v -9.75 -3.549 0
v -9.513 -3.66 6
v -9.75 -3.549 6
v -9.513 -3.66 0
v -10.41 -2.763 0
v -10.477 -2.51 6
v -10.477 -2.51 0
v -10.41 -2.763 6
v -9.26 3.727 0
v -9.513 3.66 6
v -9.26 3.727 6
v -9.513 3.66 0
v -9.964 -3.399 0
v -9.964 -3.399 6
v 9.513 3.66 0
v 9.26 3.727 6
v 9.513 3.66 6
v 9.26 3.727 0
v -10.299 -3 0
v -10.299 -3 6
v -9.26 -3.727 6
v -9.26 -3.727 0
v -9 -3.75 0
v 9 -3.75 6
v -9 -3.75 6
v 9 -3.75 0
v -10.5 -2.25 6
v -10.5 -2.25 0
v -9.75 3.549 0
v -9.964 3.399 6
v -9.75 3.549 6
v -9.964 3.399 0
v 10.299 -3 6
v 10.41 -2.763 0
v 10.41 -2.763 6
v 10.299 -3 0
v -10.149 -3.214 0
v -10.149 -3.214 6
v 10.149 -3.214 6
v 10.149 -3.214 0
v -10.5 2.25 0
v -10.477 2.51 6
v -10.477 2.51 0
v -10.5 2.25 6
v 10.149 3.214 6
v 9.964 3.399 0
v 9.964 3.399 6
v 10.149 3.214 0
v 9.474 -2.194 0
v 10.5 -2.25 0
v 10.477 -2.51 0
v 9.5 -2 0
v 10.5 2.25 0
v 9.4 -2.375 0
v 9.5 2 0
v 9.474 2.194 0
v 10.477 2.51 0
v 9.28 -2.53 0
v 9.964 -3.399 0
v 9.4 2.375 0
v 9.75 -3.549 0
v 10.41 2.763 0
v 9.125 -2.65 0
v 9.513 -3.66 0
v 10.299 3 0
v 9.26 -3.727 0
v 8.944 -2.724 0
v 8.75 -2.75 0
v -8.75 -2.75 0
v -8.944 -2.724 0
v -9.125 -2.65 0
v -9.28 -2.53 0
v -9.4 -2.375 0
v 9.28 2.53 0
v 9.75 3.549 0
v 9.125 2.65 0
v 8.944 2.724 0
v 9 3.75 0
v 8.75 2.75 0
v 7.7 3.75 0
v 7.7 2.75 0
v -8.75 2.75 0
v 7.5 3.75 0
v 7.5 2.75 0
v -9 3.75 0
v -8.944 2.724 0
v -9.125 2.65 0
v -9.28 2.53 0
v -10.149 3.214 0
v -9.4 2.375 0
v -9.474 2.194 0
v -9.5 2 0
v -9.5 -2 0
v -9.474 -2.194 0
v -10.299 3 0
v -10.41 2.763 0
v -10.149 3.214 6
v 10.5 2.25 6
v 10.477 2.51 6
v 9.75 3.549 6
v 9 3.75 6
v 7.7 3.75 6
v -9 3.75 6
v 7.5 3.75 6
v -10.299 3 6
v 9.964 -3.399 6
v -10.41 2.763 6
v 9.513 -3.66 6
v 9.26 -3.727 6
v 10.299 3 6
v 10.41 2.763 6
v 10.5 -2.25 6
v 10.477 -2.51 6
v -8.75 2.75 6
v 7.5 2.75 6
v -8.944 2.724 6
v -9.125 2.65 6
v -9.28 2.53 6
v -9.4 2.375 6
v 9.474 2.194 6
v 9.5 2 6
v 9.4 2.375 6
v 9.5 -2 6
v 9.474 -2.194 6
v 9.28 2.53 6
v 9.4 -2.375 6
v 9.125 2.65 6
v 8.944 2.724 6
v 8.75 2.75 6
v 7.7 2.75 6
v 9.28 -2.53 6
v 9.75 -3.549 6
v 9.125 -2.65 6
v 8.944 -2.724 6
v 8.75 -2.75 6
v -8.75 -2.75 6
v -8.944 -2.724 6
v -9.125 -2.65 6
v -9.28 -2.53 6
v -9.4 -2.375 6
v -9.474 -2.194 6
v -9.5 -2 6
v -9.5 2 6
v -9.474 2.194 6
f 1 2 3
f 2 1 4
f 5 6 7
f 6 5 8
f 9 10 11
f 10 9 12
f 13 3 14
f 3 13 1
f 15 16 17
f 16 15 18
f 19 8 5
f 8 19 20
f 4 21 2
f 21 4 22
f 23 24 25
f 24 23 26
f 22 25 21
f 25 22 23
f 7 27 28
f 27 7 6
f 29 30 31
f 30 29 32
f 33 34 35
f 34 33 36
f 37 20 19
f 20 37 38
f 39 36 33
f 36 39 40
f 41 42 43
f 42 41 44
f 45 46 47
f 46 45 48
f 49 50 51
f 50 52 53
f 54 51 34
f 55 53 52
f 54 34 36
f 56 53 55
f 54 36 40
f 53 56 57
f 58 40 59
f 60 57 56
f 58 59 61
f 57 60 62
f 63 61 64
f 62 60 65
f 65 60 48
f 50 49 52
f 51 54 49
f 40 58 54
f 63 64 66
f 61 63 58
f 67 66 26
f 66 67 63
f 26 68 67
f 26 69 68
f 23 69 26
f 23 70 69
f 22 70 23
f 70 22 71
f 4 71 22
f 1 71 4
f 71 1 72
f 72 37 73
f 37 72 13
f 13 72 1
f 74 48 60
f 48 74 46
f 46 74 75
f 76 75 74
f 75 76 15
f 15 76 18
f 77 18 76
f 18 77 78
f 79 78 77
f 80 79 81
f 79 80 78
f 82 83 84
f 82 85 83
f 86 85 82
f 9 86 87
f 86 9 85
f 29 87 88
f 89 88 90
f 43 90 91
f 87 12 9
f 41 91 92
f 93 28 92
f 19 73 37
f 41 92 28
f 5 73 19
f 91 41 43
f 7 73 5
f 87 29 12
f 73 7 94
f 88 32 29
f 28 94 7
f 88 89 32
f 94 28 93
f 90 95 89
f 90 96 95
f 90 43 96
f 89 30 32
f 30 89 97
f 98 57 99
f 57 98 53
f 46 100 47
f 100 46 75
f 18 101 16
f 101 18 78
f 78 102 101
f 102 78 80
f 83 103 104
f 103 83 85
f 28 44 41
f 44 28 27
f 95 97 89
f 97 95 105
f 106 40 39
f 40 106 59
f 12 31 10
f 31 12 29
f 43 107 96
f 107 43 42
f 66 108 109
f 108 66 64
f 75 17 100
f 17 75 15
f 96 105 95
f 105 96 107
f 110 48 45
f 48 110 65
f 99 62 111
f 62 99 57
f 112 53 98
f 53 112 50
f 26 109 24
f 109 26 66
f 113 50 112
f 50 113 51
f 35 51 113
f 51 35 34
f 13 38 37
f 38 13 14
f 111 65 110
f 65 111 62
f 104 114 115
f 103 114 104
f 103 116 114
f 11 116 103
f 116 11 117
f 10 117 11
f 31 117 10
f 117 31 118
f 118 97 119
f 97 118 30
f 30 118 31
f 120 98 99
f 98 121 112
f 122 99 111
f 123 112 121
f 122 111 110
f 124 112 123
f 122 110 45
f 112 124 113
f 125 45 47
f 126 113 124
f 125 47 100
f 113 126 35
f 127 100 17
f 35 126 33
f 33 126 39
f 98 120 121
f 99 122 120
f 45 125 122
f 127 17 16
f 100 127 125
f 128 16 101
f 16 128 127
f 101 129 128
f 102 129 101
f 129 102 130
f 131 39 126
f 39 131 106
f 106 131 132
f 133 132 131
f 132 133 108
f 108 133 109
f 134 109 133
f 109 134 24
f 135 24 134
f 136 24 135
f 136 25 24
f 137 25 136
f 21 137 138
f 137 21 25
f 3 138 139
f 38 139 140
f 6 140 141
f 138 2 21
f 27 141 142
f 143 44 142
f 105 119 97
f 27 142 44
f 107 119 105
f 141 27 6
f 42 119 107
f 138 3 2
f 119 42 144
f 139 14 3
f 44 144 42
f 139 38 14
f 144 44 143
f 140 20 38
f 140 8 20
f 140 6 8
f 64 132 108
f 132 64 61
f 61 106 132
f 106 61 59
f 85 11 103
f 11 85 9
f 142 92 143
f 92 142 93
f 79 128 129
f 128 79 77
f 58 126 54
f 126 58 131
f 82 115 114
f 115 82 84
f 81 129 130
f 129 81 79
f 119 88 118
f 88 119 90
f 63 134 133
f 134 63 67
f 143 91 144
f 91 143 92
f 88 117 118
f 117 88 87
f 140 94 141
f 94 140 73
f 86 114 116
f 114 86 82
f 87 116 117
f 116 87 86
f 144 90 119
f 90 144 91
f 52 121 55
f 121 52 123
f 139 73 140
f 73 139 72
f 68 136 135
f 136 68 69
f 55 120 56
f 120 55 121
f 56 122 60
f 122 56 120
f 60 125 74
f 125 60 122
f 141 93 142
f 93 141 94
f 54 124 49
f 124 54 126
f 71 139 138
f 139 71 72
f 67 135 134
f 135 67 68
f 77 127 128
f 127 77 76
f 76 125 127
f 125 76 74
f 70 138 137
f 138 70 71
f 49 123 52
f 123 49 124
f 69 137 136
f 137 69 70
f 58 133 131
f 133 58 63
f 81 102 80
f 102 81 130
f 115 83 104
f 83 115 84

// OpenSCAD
// Higher definition curves
$fa = 10;
$fs = 0.2;

shrinkcomp = 1;  // Amount of ABS shrinkage
length = 6;
inner_width = 19 * shrinkcomp;
inner_height = 5.5 * shrinkcomp;
thick = 1;
r = 2;

slot = 0.2;

module roundedcube_z(size, r=1) {
    translate([-(size[0]-r*2)/2, -(size[1]-r*2)/2, 0]) minkowski() {
        cube([size[0]-r*2, size[1]-r*2, size[2]/2]);
        cylinder(size[2]/2, r=r);
    }
}

difference() {
    roundedcube_z([inner_width+thick*2, inner_height+thick*2, length], r=1.5);
    translate([0, 0, -0.5]) roundedcube_z([inner_width, inner_height, length+1], r=0.75);
    translate([inner_width/2-2, 0, 0]) cube([slot, inner_height/2+thick+0.5, length+1]);
}
